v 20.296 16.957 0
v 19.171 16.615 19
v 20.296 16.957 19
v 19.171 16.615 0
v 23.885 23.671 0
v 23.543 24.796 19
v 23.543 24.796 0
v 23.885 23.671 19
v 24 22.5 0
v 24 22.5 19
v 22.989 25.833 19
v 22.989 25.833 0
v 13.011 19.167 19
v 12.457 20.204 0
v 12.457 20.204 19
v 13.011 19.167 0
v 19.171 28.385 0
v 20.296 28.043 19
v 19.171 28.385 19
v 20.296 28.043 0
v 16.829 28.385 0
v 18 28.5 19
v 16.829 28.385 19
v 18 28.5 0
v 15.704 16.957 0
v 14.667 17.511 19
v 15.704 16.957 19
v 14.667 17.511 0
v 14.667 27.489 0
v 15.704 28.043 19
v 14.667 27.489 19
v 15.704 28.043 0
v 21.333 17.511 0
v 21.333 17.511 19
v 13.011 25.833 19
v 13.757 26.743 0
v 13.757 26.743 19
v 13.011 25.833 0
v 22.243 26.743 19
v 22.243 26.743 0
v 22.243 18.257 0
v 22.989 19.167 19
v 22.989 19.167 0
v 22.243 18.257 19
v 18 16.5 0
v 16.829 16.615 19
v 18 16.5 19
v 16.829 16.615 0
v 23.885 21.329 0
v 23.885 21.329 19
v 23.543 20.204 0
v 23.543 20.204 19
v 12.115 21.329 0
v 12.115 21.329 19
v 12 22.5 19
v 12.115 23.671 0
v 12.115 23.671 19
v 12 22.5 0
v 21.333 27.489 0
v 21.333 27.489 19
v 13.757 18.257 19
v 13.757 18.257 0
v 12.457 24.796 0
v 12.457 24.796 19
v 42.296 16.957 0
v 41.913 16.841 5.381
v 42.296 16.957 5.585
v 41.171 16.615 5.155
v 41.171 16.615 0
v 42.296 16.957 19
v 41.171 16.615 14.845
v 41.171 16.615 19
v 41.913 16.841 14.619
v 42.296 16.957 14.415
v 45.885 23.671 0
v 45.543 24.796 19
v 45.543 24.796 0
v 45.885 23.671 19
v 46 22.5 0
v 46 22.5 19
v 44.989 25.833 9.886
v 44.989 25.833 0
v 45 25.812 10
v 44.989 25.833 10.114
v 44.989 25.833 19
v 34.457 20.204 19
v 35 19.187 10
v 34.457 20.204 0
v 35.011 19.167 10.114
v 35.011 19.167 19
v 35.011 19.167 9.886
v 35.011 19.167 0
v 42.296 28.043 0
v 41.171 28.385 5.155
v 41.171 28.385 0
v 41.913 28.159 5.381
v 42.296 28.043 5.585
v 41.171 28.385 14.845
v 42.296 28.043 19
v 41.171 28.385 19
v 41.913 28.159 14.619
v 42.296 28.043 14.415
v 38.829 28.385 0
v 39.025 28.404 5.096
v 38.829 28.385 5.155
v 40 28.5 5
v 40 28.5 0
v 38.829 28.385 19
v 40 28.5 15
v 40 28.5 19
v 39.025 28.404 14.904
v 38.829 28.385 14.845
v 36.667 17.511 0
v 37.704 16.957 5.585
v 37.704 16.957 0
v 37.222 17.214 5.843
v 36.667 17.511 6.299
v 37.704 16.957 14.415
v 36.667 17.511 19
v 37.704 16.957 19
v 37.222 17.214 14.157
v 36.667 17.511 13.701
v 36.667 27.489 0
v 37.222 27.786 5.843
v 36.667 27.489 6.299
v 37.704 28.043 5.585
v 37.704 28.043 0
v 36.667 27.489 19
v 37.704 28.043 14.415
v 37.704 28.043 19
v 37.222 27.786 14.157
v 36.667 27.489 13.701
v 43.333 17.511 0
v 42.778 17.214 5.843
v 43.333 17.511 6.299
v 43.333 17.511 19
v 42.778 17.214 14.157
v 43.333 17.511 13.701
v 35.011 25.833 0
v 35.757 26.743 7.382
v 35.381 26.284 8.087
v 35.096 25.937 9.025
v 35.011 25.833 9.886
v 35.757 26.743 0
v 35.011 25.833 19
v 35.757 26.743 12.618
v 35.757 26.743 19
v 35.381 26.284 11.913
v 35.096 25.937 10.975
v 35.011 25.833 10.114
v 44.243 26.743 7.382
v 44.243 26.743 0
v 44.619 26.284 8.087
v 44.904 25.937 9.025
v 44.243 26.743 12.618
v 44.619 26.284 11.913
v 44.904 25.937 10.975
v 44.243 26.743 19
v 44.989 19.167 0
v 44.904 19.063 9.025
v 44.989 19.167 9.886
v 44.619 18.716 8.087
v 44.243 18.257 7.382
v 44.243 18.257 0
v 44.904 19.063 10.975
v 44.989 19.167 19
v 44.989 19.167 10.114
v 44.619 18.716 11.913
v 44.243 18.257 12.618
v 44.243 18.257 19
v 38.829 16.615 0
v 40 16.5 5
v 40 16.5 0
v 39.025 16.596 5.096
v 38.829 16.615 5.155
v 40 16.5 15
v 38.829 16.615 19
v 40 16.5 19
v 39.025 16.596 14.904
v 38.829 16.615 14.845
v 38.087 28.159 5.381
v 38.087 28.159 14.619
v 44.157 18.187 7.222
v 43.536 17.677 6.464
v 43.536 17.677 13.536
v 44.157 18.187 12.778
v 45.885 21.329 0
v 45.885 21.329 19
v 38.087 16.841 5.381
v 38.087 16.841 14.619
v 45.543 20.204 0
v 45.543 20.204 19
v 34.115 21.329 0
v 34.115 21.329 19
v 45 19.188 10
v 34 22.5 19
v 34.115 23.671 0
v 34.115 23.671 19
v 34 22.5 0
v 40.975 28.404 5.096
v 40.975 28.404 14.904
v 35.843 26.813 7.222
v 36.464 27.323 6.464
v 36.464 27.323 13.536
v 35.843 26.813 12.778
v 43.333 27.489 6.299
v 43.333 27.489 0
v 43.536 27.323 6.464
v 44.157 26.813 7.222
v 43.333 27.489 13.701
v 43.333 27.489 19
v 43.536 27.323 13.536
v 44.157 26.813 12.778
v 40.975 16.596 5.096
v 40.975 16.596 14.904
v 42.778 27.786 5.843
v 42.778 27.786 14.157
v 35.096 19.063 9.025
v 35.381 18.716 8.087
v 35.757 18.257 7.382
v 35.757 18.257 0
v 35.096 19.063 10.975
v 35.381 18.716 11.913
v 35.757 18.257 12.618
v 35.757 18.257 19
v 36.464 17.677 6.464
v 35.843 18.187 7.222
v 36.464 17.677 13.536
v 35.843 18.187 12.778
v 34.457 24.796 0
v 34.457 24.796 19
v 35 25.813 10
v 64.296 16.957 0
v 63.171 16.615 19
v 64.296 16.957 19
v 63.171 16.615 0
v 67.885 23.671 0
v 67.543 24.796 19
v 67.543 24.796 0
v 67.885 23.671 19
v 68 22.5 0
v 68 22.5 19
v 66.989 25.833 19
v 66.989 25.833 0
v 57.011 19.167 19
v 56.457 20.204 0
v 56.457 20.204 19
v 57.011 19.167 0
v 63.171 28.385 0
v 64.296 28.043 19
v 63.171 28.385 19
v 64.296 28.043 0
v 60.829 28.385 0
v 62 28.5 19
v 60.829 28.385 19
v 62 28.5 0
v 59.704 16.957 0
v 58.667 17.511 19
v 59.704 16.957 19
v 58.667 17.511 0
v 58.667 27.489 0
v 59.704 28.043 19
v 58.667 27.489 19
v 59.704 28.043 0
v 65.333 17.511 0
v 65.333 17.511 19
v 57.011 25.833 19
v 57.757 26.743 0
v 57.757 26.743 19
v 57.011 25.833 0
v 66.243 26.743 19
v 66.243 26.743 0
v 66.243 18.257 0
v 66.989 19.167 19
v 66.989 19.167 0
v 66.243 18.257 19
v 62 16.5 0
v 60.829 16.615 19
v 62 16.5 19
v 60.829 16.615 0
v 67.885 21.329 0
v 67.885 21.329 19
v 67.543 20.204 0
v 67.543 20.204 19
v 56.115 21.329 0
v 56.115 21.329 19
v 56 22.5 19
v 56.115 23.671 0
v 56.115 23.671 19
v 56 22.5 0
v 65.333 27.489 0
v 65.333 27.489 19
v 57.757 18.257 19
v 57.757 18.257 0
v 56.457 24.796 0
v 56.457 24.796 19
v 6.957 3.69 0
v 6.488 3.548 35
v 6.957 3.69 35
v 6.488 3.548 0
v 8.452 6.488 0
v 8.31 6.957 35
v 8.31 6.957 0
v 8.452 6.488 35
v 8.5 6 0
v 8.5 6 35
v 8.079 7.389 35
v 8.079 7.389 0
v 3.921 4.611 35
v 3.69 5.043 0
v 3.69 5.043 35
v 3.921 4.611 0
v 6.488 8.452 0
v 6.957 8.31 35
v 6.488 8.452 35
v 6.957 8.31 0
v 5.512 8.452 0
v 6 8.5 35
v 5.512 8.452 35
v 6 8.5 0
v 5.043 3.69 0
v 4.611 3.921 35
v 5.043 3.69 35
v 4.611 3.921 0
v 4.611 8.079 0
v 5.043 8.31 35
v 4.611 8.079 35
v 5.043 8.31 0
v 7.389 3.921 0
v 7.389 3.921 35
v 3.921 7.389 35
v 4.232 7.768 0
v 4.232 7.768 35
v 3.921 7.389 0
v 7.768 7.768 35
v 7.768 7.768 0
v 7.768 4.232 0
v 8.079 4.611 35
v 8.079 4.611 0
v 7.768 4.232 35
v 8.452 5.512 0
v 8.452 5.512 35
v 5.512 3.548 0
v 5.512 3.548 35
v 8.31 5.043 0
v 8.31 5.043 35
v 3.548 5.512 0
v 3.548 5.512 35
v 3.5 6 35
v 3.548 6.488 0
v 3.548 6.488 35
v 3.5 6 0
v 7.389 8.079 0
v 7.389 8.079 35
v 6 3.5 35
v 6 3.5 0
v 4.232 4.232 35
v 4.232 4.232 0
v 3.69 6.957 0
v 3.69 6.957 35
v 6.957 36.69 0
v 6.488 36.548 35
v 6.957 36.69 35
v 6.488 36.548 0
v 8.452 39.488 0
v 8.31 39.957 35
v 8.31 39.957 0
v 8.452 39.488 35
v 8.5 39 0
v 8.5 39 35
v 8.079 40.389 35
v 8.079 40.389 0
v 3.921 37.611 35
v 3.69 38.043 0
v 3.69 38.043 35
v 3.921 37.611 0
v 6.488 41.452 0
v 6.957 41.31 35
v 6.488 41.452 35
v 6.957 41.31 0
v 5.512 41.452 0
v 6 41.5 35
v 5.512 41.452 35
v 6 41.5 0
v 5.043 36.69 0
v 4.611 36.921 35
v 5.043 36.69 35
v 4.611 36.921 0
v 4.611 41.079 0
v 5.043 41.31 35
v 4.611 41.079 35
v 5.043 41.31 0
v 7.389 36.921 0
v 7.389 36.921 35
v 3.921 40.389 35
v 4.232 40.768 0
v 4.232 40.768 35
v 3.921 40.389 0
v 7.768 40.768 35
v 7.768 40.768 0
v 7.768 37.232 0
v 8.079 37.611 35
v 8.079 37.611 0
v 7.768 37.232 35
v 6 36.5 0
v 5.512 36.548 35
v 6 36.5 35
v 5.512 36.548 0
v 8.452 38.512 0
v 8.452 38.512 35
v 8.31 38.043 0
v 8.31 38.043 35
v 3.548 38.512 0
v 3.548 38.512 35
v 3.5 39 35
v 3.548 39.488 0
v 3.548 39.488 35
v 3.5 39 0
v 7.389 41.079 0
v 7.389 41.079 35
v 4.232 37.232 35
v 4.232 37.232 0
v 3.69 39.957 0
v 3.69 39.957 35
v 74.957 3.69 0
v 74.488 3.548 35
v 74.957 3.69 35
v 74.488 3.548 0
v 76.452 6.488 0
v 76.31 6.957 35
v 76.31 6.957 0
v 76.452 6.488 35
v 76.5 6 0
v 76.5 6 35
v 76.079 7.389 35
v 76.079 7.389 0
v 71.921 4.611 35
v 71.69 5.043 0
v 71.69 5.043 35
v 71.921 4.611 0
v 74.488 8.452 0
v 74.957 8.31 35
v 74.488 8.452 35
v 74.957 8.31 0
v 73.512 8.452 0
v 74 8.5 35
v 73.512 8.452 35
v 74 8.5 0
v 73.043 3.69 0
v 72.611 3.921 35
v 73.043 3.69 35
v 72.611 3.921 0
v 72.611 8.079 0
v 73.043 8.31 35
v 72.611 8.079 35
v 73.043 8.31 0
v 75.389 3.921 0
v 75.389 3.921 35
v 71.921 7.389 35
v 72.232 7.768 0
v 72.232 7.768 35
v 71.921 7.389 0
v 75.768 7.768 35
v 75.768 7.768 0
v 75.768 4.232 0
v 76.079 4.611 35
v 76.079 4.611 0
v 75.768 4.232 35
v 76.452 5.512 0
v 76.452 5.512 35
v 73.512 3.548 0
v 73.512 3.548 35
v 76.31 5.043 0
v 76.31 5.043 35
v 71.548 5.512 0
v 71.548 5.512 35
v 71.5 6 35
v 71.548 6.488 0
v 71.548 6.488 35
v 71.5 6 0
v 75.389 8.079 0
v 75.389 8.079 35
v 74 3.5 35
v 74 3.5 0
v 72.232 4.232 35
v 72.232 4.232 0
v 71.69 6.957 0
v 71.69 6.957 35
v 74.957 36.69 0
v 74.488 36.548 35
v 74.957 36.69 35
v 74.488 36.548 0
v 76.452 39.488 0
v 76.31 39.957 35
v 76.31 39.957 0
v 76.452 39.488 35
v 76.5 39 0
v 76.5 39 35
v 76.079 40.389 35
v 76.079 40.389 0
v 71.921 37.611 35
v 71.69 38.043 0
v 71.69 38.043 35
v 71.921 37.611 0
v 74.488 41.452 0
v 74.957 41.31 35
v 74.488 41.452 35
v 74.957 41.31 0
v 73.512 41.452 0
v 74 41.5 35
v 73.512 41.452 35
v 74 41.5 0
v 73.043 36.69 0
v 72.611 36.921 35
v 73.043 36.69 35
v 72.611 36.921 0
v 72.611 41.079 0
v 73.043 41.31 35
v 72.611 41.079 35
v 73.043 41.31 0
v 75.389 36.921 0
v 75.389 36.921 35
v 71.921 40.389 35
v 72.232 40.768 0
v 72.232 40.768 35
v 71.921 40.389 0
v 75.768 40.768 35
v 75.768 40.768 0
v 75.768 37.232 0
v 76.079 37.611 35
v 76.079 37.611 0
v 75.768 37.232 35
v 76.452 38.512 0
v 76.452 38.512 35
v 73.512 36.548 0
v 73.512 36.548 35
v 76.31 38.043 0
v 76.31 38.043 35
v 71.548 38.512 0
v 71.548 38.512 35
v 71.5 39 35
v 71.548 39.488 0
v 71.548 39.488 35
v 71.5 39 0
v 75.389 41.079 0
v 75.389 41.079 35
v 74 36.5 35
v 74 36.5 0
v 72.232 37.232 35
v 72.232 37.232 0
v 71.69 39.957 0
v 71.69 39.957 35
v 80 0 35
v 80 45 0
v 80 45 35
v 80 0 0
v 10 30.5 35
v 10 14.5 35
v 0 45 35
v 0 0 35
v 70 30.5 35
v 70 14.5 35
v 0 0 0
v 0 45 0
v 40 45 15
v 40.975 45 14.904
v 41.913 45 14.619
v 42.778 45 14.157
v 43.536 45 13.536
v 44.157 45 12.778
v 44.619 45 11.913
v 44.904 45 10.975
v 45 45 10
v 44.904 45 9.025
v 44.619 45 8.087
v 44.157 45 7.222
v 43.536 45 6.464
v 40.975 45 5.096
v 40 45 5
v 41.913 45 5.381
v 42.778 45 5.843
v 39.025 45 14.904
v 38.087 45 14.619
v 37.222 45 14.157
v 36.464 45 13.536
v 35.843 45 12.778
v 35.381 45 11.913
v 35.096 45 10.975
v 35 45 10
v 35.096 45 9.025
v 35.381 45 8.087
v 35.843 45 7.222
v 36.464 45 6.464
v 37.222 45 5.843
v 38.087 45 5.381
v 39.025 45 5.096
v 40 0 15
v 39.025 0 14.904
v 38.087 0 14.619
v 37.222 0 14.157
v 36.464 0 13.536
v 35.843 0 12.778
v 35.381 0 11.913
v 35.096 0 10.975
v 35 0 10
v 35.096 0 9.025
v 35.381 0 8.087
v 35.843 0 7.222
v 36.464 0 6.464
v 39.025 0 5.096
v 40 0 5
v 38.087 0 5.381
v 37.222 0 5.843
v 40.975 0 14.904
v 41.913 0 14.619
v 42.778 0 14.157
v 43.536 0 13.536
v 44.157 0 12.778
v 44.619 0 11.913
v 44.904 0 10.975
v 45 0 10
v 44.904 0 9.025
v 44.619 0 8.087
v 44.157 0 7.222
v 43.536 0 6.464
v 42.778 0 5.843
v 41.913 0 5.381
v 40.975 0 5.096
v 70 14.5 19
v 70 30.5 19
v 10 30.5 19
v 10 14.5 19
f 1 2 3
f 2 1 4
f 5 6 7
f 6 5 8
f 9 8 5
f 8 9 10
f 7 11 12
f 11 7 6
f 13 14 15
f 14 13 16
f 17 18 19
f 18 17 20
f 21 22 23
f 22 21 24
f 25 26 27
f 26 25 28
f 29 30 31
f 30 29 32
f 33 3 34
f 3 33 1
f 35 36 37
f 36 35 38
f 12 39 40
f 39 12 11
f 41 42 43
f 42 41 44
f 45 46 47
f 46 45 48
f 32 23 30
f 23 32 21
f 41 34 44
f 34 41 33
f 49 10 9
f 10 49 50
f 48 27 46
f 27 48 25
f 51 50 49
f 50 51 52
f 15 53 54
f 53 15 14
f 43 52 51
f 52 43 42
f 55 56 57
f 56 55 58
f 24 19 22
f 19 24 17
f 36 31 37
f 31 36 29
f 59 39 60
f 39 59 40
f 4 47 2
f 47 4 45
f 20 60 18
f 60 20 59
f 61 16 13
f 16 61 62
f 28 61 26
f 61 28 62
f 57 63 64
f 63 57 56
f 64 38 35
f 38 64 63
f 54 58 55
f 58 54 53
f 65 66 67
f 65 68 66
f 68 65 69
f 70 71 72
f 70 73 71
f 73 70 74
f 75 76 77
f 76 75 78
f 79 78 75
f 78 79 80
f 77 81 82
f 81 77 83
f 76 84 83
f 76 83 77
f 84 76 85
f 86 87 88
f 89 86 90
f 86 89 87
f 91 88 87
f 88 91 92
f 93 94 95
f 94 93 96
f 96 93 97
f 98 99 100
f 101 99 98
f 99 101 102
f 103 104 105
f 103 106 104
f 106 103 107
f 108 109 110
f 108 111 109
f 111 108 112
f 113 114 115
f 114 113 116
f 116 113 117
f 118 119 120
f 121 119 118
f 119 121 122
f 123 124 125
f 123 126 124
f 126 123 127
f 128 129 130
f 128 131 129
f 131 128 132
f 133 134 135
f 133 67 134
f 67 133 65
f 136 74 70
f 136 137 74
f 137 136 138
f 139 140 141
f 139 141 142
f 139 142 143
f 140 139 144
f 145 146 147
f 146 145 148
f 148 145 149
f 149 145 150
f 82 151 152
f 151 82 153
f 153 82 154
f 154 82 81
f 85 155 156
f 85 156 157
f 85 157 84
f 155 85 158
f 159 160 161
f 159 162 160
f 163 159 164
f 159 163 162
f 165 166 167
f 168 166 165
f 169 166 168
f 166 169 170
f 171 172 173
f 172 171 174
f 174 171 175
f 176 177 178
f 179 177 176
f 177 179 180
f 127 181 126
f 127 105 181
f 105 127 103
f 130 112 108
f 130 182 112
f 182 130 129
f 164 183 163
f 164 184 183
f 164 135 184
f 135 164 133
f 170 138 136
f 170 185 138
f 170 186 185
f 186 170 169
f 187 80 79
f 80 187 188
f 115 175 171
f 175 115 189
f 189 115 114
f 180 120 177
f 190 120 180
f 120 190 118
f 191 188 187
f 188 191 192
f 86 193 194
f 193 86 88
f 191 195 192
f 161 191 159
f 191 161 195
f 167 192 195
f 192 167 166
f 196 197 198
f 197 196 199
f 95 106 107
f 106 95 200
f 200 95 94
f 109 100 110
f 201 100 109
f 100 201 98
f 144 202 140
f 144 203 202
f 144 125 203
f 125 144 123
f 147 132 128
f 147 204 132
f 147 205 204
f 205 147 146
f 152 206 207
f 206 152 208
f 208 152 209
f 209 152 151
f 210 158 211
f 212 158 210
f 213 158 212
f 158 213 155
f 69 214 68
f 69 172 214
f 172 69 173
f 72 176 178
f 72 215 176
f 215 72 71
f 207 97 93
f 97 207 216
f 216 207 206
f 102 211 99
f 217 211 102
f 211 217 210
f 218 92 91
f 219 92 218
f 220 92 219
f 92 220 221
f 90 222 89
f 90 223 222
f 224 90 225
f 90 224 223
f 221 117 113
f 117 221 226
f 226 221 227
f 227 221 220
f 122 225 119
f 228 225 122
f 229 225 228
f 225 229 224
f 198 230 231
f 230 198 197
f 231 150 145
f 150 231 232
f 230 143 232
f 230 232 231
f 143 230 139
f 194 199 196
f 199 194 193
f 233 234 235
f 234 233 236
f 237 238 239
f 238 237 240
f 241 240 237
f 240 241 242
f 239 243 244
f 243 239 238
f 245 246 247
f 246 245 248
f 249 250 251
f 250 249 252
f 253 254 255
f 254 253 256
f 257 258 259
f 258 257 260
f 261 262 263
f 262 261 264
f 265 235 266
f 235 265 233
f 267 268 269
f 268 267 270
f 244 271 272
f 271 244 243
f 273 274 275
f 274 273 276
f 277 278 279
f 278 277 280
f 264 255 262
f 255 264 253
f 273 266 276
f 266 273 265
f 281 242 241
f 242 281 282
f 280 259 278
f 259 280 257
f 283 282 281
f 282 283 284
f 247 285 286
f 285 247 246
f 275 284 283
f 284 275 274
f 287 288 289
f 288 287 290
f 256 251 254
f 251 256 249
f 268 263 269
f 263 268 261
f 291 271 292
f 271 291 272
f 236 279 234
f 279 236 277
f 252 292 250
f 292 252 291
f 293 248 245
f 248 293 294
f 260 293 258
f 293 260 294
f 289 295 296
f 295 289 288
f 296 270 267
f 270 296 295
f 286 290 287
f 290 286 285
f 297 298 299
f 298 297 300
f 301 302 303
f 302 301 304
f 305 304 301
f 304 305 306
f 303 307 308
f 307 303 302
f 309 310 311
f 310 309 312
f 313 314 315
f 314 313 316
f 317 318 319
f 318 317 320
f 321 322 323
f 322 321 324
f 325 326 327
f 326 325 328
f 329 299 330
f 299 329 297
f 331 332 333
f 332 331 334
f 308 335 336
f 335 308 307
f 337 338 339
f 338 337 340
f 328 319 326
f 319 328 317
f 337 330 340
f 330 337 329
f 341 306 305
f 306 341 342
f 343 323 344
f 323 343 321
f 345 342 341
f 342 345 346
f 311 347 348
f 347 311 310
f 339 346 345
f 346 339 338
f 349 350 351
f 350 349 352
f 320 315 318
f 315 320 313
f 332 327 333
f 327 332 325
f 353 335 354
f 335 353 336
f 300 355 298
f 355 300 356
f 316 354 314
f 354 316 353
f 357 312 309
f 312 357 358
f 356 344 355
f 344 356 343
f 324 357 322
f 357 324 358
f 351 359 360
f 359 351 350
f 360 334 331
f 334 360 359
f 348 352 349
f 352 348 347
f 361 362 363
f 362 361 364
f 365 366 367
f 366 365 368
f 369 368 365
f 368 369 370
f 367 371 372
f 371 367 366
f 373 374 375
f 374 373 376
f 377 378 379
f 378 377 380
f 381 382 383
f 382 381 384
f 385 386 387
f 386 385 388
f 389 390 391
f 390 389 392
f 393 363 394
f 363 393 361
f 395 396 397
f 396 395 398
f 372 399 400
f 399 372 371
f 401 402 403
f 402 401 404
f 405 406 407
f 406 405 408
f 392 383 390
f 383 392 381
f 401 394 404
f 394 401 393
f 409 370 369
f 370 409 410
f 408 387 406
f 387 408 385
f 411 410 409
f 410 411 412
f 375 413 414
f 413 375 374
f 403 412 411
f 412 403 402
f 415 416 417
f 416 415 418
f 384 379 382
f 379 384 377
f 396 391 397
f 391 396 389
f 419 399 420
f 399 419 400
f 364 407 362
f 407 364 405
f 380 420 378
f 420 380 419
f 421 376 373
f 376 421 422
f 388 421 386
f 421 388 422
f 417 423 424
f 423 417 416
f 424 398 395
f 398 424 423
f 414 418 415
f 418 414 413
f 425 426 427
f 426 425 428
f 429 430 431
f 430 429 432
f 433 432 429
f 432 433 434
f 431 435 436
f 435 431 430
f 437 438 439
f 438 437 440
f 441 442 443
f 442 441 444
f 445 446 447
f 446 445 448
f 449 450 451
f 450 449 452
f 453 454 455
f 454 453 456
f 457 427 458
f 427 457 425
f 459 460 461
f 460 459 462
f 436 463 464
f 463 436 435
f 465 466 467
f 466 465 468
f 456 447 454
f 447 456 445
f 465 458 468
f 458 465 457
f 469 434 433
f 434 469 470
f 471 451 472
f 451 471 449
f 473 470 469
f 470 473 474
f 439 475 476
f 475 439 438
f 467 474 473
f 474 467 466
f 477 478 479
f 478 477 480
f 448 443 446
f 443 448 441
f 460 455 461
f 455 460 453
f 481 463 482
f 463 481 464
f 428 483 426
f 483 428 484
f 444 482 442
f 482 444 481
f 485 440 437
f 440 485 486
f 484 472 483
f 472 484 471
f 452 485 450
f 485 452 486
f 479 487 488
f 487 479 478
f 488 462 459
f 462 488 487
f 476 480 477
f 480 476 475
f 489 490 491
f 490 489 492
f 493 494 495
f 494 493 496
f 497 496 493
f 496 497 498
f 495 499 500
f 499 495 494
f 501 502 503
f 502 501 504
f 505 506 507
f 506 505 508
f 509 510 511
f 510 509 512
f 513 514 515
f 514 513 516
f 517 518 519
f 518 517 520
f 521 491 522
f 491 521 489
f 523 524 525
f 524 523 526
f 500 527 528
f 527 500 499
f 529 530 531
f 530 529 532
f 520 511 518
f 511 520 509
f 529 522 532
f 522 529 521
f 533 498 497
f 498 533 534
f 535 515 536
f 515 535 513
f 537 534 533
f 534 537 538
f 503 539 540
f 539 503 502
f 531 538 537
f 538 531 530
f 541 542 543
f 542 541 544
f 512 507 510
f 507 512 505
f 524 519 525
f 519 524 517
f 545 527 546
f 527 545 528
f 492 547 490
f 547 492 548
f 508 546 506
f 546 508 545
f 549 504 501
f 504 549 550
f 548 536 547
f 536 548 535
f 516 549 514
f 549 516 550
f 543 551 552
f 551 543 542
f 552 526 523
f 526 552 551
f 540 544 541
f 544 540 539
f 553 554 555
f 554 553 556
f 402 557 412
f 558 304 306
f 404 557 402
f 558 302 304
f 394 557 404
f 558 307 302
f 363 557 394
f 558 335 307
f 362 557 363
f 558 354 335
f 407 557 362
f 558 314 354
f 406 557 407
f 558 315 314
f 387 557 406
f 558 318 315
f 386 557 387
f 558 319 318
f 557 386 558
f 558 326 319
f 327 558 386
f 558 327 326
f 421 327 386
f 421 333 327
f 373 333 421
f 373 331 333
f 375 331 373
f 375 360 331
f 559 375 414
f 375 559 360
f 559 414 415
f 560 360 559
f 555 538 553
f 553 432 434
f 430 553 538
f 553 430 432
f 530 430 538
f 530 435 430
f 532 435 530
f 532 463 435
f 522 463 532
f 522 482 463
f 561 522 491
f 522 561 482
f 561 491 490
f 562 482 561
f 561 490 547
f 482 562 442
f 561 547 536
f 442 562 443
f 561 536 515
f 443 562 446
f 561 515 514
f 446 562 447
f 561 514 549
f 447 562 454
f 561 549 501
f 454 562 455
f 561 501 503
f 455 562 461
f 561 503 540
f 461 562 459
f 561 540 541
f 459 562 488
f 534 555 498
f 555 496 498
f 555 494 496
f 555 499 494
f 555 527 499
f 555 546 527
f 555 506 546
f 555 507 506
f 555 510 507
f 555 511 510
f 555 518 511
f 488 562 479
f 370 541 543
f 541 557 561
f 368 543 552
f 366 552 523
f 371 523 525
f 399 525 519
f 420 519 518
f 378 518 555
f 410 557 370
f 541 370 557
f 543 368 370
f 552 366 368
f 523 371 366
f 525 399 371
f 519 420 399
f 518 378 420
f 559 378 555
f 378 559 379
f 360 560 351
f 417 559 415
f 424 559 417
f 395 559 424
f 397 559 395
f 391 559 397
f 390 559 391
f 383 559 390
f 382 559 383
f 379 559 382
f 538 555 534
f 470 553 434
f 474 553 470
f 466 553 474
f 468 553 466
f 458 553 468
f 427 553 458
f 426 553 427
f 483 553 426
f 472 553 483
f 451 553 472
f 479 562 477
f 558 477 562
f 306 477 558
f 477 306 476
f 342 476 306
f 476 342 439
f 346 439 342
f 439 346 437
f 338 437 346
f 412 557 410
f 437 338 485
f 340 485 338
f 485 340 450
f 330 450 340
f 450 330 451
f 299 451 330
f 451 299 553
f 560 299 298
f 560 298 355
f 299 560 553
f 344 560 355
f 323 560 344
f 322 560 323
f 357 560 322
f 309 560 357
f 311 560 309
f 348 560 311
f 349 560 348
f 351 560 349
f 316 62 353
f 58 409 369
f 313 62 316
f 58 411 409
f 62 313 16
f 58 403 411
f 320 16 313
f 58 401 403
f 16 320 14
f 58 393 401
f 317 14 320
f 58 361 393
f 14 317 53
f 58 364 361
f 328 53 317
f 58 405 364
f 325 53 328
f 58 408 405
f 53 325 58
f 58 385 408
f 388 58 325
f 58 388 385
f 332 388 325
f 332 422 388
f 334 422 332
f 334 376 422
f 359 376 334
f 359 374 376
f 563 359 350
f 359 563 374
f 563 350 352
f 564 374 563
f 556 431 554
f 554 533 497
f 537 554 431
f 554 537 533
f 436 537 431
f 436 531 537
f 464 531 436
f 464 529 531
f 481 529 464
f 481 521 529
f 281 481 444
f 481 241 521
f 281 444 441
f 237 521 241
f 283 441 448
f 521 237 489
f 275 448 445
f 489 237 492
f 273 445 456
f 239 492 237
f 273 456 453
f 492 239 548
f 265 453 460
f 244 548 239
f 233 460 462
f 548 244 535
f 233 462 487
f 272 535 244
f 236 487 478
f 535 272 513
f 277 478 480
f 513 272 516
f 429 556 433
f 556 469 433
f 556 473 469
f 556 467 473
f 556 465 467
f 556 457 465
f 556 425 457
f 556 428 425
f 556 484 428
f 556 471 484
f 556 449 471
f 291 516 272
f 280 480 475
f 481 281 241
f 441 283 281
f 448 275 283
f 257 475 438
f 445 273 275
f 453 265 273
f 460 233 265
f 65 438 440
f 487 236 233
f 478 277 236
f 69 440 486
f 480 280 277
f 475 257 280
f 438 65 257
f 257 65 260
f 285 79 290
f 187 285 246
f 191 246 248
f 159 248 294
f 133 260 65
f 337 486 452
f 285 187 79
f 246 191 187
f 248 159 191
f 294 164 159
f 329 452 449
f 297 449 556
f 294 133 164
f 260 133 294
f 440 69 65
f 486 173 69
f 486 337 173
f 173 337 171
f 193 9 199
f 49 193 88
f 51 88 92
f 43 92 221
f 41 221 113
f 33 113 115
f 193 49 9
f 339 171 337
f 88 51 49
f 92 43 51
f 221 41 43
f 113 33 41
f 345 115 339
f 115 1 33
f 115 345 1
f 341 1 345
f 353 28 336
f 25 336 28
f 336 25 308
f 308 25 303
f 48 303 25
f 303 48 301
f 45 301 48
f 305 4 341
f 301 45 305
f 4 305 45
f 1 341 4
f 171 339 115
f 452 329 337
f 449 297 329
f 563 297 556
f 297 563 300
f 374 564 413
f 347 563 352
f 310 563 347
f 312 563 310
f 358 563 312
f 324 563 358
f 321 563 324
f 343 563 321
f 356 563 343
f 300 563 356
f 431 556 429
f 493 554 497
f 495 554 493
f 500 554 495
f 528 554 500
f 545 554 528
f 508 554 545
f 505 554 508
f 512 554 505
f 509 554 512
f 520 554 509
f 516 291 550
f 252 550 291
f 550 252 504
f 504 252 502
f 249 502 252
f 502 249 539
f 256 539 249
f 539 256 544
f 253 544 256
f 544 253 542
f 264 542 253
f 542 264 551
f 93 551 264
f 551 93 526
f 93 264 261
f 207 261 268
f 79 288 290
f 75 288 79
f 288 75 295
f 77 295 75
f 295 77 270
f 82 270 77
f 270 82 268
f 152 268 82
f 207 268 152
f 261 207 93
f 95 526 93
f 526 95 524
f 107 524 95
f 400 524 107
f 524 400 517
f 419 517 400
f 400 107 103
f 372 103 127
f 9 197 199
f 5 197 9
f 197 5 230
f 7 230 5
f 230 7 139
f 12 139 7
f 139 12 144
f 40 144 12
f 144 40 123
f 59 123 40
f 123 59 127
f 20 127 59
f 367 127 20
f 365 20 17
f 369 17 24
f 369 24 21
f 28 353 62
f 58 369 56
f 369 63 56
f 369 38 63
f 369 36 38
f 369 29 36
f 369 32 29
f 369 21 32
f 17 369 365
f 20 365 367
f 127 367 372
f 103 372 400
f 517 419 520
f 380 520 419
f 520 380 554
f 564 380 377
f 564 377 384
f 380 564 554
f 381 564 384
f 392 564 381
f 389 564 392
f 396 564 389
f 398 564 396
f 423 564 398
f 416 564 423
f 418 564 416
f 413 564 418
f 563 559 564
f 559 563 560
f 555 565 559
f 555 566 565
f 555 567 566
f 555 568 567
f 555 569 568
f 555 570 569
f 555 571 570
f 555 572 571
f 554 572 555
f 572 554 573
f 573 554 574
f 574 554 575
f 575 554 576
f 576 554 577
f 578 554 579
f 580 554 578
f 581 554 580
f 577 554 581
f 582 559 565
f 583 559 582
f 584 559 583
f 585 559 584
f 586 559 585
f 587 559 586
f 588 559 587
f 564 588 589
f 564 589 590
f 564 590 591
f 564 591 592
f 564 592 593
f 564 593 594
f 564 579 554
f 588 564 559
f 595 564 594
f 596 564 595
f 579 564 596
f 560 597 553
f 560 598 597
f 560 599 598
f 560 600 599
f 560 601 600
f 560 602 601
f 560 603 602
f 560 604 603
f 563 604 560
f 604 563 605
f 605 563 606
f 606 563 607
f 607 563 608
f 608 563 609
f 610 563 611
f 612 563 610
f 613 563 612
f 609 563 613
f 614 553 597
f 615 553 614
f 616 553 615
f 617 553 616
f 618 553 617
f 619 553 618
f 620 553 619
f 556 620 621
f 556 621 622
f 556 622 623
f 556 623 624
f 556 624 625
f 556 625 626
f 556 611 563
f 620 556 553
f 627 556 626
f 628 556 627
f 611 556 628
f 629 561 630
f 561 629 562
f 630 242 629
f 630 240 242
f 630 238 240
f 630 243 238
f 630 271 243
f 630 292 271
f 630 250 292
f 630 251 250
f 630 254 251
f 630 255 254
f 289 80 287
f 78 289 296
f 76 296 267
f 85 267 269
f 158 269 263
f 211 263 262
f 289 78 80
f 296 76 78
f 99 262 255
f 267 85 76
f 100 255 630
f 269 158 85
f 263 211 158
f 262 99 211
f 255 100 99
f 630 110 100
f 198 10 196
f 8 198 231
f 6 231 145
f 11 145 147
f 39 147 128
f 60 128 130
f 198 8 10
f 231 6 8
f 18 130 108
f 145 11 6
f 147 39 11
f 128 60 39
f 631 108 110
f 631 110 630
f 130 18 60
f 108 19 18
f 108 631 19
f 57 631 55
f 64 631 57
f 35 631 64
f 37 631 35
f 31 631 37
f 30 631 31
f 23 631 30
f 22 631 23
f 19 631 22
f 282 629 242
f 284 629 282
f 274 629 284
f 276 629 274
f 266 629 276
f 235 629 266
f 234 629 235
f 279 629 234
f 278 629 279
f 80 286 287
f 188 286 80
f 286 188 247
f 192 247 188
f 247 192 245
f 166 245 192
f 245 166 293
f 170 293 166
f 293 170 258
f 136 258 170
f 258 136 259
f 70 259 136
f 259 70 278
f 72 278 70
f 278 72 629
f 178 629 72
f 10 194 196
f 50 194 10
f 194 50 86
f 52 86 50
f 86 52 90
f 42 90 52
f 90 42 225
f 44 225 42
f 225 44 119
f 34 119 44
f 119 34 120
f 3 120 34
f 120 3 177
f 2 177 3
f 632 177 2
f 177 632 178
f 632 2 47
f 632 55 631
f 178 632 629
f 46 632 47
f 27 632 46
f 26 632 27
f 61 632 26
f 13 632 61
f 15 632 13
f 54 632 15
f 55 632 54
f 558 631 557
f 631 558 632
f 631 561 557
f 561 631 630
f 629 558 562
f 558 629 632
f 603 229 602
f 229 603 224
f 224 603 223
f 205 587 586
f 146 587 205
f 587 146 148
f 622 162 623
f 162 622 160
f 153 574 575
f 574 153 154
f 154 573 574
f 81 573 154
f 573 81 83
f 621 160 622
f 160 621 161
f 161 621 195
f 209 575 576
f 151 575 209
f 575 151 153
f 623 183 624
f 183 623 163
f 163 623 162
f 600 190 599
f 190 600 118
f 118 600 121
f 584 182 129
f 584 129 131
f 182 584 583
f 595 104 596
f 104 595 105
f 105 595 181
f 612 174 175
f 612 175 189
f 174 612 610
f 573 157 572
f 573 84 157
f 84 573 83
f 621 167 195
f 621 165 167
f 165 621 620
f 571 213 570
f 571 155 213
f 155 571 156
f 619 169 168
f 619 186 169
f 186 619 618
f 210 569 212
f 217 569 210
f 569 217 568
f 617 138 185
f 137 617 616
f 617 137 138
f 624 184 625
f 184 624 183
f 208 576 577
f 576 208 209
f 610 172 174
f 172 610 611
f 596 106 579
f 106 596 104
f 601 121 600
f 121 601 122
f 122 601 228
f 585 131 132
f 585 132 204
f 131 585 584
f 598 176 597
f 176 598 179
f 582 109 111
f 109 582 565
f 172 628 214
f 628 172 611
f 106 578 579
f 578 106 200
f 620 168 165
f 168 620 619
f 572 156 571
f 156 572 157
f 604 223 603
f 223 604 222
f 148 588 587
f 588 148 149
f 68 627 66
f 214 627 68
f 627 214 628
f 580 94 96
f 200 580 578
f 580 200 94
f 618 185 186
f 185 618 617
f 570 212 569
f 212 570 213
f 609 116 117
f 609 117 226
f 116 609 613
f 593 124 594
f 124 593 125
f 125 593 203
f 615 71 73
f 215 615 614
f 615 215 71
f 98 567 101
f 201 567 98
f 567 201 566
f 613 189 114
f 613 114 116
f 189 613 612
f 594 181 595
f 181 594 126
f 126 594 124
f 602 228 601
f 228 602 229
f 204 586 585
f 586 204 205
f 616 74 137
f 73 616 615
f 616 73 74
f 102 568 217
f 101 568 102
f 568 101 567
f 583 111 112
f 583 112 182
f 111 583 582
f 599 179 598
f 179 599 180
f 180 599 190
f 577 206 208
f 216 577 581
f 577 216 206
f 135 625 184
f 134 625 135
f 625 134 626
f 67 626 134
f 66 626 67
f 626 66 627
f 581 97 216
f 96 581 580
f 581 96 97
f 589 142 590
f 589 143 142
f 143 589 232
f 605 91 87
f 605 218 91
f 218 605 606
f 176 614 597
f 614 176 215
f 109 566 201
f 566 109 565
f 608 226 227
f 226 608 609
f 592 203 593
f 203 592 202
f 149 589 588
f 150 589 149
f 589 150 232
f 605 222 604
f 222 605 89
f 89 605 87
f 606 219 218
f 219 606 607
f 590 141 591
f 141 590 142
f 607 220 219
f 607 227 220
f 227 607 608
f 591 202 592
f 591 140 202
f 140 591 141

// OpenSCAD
$fn = 32;

// ----------------------------------------------------------------------
// Manifold block: side_outlet manifold
// ----------------------------------------------------------------------

// --- parameters (mm) ---
block_l = 80;             // block length, X
block_w = 45;             // block width, Y
block_h = 35;             // block height, Z
port_d = 12;              // port bore diameter
port_pitch = 22;          // port pitch along X
gallery_d = 16;           // top gallery width, Y
gallery_depth = 16;       // gallery pocket depth
wall_p = 10;              // gallery end wall thickness, X
mnt_d = 5;                // mounting hole diameter
mnt_in = 6;               // mounting hole inset from the edges
out_d = 10;               // outlet bore diameter
out_z = 10;               // outlet axis height
fit_tol = 0.1;            // tolerance for press fits, mm
free_tol = 0.3;           // tolerance for clearance fits, mm

n_ports = 3;  // ports in the row
port_x0 = (block_l - (n_ports - 1) * port_pitch) / 2;  // first port X

difference() {
  cube([block_l, block_w, block_h]);
  for (i = [0 : n_ports - 1])
    translate([port_x0 + i * port_pitch, block_w / 2, -1])
      cylinder(h = block_h + 2, d = port_d);
  translate([wall_p, block_w / 2 - gallery_d / 2, block_h - gallery_depth])
    cube([block_l - 2 * wall_p, gallery_d, gallery_depth + 1]);
  for (cx = [mnt_in, block_l - mnt_in])
    for (cy = [mnt_in, block_w - mnt_in])
      translate([cx, cy, -1]) cylinder(h = block_h + 2, d = mnt_d);
  translate([block_l / 2, -1, out_z]) rotate([-90, 0, 0])
    cylinder(h = block_w + 2, d = out_d);
}
